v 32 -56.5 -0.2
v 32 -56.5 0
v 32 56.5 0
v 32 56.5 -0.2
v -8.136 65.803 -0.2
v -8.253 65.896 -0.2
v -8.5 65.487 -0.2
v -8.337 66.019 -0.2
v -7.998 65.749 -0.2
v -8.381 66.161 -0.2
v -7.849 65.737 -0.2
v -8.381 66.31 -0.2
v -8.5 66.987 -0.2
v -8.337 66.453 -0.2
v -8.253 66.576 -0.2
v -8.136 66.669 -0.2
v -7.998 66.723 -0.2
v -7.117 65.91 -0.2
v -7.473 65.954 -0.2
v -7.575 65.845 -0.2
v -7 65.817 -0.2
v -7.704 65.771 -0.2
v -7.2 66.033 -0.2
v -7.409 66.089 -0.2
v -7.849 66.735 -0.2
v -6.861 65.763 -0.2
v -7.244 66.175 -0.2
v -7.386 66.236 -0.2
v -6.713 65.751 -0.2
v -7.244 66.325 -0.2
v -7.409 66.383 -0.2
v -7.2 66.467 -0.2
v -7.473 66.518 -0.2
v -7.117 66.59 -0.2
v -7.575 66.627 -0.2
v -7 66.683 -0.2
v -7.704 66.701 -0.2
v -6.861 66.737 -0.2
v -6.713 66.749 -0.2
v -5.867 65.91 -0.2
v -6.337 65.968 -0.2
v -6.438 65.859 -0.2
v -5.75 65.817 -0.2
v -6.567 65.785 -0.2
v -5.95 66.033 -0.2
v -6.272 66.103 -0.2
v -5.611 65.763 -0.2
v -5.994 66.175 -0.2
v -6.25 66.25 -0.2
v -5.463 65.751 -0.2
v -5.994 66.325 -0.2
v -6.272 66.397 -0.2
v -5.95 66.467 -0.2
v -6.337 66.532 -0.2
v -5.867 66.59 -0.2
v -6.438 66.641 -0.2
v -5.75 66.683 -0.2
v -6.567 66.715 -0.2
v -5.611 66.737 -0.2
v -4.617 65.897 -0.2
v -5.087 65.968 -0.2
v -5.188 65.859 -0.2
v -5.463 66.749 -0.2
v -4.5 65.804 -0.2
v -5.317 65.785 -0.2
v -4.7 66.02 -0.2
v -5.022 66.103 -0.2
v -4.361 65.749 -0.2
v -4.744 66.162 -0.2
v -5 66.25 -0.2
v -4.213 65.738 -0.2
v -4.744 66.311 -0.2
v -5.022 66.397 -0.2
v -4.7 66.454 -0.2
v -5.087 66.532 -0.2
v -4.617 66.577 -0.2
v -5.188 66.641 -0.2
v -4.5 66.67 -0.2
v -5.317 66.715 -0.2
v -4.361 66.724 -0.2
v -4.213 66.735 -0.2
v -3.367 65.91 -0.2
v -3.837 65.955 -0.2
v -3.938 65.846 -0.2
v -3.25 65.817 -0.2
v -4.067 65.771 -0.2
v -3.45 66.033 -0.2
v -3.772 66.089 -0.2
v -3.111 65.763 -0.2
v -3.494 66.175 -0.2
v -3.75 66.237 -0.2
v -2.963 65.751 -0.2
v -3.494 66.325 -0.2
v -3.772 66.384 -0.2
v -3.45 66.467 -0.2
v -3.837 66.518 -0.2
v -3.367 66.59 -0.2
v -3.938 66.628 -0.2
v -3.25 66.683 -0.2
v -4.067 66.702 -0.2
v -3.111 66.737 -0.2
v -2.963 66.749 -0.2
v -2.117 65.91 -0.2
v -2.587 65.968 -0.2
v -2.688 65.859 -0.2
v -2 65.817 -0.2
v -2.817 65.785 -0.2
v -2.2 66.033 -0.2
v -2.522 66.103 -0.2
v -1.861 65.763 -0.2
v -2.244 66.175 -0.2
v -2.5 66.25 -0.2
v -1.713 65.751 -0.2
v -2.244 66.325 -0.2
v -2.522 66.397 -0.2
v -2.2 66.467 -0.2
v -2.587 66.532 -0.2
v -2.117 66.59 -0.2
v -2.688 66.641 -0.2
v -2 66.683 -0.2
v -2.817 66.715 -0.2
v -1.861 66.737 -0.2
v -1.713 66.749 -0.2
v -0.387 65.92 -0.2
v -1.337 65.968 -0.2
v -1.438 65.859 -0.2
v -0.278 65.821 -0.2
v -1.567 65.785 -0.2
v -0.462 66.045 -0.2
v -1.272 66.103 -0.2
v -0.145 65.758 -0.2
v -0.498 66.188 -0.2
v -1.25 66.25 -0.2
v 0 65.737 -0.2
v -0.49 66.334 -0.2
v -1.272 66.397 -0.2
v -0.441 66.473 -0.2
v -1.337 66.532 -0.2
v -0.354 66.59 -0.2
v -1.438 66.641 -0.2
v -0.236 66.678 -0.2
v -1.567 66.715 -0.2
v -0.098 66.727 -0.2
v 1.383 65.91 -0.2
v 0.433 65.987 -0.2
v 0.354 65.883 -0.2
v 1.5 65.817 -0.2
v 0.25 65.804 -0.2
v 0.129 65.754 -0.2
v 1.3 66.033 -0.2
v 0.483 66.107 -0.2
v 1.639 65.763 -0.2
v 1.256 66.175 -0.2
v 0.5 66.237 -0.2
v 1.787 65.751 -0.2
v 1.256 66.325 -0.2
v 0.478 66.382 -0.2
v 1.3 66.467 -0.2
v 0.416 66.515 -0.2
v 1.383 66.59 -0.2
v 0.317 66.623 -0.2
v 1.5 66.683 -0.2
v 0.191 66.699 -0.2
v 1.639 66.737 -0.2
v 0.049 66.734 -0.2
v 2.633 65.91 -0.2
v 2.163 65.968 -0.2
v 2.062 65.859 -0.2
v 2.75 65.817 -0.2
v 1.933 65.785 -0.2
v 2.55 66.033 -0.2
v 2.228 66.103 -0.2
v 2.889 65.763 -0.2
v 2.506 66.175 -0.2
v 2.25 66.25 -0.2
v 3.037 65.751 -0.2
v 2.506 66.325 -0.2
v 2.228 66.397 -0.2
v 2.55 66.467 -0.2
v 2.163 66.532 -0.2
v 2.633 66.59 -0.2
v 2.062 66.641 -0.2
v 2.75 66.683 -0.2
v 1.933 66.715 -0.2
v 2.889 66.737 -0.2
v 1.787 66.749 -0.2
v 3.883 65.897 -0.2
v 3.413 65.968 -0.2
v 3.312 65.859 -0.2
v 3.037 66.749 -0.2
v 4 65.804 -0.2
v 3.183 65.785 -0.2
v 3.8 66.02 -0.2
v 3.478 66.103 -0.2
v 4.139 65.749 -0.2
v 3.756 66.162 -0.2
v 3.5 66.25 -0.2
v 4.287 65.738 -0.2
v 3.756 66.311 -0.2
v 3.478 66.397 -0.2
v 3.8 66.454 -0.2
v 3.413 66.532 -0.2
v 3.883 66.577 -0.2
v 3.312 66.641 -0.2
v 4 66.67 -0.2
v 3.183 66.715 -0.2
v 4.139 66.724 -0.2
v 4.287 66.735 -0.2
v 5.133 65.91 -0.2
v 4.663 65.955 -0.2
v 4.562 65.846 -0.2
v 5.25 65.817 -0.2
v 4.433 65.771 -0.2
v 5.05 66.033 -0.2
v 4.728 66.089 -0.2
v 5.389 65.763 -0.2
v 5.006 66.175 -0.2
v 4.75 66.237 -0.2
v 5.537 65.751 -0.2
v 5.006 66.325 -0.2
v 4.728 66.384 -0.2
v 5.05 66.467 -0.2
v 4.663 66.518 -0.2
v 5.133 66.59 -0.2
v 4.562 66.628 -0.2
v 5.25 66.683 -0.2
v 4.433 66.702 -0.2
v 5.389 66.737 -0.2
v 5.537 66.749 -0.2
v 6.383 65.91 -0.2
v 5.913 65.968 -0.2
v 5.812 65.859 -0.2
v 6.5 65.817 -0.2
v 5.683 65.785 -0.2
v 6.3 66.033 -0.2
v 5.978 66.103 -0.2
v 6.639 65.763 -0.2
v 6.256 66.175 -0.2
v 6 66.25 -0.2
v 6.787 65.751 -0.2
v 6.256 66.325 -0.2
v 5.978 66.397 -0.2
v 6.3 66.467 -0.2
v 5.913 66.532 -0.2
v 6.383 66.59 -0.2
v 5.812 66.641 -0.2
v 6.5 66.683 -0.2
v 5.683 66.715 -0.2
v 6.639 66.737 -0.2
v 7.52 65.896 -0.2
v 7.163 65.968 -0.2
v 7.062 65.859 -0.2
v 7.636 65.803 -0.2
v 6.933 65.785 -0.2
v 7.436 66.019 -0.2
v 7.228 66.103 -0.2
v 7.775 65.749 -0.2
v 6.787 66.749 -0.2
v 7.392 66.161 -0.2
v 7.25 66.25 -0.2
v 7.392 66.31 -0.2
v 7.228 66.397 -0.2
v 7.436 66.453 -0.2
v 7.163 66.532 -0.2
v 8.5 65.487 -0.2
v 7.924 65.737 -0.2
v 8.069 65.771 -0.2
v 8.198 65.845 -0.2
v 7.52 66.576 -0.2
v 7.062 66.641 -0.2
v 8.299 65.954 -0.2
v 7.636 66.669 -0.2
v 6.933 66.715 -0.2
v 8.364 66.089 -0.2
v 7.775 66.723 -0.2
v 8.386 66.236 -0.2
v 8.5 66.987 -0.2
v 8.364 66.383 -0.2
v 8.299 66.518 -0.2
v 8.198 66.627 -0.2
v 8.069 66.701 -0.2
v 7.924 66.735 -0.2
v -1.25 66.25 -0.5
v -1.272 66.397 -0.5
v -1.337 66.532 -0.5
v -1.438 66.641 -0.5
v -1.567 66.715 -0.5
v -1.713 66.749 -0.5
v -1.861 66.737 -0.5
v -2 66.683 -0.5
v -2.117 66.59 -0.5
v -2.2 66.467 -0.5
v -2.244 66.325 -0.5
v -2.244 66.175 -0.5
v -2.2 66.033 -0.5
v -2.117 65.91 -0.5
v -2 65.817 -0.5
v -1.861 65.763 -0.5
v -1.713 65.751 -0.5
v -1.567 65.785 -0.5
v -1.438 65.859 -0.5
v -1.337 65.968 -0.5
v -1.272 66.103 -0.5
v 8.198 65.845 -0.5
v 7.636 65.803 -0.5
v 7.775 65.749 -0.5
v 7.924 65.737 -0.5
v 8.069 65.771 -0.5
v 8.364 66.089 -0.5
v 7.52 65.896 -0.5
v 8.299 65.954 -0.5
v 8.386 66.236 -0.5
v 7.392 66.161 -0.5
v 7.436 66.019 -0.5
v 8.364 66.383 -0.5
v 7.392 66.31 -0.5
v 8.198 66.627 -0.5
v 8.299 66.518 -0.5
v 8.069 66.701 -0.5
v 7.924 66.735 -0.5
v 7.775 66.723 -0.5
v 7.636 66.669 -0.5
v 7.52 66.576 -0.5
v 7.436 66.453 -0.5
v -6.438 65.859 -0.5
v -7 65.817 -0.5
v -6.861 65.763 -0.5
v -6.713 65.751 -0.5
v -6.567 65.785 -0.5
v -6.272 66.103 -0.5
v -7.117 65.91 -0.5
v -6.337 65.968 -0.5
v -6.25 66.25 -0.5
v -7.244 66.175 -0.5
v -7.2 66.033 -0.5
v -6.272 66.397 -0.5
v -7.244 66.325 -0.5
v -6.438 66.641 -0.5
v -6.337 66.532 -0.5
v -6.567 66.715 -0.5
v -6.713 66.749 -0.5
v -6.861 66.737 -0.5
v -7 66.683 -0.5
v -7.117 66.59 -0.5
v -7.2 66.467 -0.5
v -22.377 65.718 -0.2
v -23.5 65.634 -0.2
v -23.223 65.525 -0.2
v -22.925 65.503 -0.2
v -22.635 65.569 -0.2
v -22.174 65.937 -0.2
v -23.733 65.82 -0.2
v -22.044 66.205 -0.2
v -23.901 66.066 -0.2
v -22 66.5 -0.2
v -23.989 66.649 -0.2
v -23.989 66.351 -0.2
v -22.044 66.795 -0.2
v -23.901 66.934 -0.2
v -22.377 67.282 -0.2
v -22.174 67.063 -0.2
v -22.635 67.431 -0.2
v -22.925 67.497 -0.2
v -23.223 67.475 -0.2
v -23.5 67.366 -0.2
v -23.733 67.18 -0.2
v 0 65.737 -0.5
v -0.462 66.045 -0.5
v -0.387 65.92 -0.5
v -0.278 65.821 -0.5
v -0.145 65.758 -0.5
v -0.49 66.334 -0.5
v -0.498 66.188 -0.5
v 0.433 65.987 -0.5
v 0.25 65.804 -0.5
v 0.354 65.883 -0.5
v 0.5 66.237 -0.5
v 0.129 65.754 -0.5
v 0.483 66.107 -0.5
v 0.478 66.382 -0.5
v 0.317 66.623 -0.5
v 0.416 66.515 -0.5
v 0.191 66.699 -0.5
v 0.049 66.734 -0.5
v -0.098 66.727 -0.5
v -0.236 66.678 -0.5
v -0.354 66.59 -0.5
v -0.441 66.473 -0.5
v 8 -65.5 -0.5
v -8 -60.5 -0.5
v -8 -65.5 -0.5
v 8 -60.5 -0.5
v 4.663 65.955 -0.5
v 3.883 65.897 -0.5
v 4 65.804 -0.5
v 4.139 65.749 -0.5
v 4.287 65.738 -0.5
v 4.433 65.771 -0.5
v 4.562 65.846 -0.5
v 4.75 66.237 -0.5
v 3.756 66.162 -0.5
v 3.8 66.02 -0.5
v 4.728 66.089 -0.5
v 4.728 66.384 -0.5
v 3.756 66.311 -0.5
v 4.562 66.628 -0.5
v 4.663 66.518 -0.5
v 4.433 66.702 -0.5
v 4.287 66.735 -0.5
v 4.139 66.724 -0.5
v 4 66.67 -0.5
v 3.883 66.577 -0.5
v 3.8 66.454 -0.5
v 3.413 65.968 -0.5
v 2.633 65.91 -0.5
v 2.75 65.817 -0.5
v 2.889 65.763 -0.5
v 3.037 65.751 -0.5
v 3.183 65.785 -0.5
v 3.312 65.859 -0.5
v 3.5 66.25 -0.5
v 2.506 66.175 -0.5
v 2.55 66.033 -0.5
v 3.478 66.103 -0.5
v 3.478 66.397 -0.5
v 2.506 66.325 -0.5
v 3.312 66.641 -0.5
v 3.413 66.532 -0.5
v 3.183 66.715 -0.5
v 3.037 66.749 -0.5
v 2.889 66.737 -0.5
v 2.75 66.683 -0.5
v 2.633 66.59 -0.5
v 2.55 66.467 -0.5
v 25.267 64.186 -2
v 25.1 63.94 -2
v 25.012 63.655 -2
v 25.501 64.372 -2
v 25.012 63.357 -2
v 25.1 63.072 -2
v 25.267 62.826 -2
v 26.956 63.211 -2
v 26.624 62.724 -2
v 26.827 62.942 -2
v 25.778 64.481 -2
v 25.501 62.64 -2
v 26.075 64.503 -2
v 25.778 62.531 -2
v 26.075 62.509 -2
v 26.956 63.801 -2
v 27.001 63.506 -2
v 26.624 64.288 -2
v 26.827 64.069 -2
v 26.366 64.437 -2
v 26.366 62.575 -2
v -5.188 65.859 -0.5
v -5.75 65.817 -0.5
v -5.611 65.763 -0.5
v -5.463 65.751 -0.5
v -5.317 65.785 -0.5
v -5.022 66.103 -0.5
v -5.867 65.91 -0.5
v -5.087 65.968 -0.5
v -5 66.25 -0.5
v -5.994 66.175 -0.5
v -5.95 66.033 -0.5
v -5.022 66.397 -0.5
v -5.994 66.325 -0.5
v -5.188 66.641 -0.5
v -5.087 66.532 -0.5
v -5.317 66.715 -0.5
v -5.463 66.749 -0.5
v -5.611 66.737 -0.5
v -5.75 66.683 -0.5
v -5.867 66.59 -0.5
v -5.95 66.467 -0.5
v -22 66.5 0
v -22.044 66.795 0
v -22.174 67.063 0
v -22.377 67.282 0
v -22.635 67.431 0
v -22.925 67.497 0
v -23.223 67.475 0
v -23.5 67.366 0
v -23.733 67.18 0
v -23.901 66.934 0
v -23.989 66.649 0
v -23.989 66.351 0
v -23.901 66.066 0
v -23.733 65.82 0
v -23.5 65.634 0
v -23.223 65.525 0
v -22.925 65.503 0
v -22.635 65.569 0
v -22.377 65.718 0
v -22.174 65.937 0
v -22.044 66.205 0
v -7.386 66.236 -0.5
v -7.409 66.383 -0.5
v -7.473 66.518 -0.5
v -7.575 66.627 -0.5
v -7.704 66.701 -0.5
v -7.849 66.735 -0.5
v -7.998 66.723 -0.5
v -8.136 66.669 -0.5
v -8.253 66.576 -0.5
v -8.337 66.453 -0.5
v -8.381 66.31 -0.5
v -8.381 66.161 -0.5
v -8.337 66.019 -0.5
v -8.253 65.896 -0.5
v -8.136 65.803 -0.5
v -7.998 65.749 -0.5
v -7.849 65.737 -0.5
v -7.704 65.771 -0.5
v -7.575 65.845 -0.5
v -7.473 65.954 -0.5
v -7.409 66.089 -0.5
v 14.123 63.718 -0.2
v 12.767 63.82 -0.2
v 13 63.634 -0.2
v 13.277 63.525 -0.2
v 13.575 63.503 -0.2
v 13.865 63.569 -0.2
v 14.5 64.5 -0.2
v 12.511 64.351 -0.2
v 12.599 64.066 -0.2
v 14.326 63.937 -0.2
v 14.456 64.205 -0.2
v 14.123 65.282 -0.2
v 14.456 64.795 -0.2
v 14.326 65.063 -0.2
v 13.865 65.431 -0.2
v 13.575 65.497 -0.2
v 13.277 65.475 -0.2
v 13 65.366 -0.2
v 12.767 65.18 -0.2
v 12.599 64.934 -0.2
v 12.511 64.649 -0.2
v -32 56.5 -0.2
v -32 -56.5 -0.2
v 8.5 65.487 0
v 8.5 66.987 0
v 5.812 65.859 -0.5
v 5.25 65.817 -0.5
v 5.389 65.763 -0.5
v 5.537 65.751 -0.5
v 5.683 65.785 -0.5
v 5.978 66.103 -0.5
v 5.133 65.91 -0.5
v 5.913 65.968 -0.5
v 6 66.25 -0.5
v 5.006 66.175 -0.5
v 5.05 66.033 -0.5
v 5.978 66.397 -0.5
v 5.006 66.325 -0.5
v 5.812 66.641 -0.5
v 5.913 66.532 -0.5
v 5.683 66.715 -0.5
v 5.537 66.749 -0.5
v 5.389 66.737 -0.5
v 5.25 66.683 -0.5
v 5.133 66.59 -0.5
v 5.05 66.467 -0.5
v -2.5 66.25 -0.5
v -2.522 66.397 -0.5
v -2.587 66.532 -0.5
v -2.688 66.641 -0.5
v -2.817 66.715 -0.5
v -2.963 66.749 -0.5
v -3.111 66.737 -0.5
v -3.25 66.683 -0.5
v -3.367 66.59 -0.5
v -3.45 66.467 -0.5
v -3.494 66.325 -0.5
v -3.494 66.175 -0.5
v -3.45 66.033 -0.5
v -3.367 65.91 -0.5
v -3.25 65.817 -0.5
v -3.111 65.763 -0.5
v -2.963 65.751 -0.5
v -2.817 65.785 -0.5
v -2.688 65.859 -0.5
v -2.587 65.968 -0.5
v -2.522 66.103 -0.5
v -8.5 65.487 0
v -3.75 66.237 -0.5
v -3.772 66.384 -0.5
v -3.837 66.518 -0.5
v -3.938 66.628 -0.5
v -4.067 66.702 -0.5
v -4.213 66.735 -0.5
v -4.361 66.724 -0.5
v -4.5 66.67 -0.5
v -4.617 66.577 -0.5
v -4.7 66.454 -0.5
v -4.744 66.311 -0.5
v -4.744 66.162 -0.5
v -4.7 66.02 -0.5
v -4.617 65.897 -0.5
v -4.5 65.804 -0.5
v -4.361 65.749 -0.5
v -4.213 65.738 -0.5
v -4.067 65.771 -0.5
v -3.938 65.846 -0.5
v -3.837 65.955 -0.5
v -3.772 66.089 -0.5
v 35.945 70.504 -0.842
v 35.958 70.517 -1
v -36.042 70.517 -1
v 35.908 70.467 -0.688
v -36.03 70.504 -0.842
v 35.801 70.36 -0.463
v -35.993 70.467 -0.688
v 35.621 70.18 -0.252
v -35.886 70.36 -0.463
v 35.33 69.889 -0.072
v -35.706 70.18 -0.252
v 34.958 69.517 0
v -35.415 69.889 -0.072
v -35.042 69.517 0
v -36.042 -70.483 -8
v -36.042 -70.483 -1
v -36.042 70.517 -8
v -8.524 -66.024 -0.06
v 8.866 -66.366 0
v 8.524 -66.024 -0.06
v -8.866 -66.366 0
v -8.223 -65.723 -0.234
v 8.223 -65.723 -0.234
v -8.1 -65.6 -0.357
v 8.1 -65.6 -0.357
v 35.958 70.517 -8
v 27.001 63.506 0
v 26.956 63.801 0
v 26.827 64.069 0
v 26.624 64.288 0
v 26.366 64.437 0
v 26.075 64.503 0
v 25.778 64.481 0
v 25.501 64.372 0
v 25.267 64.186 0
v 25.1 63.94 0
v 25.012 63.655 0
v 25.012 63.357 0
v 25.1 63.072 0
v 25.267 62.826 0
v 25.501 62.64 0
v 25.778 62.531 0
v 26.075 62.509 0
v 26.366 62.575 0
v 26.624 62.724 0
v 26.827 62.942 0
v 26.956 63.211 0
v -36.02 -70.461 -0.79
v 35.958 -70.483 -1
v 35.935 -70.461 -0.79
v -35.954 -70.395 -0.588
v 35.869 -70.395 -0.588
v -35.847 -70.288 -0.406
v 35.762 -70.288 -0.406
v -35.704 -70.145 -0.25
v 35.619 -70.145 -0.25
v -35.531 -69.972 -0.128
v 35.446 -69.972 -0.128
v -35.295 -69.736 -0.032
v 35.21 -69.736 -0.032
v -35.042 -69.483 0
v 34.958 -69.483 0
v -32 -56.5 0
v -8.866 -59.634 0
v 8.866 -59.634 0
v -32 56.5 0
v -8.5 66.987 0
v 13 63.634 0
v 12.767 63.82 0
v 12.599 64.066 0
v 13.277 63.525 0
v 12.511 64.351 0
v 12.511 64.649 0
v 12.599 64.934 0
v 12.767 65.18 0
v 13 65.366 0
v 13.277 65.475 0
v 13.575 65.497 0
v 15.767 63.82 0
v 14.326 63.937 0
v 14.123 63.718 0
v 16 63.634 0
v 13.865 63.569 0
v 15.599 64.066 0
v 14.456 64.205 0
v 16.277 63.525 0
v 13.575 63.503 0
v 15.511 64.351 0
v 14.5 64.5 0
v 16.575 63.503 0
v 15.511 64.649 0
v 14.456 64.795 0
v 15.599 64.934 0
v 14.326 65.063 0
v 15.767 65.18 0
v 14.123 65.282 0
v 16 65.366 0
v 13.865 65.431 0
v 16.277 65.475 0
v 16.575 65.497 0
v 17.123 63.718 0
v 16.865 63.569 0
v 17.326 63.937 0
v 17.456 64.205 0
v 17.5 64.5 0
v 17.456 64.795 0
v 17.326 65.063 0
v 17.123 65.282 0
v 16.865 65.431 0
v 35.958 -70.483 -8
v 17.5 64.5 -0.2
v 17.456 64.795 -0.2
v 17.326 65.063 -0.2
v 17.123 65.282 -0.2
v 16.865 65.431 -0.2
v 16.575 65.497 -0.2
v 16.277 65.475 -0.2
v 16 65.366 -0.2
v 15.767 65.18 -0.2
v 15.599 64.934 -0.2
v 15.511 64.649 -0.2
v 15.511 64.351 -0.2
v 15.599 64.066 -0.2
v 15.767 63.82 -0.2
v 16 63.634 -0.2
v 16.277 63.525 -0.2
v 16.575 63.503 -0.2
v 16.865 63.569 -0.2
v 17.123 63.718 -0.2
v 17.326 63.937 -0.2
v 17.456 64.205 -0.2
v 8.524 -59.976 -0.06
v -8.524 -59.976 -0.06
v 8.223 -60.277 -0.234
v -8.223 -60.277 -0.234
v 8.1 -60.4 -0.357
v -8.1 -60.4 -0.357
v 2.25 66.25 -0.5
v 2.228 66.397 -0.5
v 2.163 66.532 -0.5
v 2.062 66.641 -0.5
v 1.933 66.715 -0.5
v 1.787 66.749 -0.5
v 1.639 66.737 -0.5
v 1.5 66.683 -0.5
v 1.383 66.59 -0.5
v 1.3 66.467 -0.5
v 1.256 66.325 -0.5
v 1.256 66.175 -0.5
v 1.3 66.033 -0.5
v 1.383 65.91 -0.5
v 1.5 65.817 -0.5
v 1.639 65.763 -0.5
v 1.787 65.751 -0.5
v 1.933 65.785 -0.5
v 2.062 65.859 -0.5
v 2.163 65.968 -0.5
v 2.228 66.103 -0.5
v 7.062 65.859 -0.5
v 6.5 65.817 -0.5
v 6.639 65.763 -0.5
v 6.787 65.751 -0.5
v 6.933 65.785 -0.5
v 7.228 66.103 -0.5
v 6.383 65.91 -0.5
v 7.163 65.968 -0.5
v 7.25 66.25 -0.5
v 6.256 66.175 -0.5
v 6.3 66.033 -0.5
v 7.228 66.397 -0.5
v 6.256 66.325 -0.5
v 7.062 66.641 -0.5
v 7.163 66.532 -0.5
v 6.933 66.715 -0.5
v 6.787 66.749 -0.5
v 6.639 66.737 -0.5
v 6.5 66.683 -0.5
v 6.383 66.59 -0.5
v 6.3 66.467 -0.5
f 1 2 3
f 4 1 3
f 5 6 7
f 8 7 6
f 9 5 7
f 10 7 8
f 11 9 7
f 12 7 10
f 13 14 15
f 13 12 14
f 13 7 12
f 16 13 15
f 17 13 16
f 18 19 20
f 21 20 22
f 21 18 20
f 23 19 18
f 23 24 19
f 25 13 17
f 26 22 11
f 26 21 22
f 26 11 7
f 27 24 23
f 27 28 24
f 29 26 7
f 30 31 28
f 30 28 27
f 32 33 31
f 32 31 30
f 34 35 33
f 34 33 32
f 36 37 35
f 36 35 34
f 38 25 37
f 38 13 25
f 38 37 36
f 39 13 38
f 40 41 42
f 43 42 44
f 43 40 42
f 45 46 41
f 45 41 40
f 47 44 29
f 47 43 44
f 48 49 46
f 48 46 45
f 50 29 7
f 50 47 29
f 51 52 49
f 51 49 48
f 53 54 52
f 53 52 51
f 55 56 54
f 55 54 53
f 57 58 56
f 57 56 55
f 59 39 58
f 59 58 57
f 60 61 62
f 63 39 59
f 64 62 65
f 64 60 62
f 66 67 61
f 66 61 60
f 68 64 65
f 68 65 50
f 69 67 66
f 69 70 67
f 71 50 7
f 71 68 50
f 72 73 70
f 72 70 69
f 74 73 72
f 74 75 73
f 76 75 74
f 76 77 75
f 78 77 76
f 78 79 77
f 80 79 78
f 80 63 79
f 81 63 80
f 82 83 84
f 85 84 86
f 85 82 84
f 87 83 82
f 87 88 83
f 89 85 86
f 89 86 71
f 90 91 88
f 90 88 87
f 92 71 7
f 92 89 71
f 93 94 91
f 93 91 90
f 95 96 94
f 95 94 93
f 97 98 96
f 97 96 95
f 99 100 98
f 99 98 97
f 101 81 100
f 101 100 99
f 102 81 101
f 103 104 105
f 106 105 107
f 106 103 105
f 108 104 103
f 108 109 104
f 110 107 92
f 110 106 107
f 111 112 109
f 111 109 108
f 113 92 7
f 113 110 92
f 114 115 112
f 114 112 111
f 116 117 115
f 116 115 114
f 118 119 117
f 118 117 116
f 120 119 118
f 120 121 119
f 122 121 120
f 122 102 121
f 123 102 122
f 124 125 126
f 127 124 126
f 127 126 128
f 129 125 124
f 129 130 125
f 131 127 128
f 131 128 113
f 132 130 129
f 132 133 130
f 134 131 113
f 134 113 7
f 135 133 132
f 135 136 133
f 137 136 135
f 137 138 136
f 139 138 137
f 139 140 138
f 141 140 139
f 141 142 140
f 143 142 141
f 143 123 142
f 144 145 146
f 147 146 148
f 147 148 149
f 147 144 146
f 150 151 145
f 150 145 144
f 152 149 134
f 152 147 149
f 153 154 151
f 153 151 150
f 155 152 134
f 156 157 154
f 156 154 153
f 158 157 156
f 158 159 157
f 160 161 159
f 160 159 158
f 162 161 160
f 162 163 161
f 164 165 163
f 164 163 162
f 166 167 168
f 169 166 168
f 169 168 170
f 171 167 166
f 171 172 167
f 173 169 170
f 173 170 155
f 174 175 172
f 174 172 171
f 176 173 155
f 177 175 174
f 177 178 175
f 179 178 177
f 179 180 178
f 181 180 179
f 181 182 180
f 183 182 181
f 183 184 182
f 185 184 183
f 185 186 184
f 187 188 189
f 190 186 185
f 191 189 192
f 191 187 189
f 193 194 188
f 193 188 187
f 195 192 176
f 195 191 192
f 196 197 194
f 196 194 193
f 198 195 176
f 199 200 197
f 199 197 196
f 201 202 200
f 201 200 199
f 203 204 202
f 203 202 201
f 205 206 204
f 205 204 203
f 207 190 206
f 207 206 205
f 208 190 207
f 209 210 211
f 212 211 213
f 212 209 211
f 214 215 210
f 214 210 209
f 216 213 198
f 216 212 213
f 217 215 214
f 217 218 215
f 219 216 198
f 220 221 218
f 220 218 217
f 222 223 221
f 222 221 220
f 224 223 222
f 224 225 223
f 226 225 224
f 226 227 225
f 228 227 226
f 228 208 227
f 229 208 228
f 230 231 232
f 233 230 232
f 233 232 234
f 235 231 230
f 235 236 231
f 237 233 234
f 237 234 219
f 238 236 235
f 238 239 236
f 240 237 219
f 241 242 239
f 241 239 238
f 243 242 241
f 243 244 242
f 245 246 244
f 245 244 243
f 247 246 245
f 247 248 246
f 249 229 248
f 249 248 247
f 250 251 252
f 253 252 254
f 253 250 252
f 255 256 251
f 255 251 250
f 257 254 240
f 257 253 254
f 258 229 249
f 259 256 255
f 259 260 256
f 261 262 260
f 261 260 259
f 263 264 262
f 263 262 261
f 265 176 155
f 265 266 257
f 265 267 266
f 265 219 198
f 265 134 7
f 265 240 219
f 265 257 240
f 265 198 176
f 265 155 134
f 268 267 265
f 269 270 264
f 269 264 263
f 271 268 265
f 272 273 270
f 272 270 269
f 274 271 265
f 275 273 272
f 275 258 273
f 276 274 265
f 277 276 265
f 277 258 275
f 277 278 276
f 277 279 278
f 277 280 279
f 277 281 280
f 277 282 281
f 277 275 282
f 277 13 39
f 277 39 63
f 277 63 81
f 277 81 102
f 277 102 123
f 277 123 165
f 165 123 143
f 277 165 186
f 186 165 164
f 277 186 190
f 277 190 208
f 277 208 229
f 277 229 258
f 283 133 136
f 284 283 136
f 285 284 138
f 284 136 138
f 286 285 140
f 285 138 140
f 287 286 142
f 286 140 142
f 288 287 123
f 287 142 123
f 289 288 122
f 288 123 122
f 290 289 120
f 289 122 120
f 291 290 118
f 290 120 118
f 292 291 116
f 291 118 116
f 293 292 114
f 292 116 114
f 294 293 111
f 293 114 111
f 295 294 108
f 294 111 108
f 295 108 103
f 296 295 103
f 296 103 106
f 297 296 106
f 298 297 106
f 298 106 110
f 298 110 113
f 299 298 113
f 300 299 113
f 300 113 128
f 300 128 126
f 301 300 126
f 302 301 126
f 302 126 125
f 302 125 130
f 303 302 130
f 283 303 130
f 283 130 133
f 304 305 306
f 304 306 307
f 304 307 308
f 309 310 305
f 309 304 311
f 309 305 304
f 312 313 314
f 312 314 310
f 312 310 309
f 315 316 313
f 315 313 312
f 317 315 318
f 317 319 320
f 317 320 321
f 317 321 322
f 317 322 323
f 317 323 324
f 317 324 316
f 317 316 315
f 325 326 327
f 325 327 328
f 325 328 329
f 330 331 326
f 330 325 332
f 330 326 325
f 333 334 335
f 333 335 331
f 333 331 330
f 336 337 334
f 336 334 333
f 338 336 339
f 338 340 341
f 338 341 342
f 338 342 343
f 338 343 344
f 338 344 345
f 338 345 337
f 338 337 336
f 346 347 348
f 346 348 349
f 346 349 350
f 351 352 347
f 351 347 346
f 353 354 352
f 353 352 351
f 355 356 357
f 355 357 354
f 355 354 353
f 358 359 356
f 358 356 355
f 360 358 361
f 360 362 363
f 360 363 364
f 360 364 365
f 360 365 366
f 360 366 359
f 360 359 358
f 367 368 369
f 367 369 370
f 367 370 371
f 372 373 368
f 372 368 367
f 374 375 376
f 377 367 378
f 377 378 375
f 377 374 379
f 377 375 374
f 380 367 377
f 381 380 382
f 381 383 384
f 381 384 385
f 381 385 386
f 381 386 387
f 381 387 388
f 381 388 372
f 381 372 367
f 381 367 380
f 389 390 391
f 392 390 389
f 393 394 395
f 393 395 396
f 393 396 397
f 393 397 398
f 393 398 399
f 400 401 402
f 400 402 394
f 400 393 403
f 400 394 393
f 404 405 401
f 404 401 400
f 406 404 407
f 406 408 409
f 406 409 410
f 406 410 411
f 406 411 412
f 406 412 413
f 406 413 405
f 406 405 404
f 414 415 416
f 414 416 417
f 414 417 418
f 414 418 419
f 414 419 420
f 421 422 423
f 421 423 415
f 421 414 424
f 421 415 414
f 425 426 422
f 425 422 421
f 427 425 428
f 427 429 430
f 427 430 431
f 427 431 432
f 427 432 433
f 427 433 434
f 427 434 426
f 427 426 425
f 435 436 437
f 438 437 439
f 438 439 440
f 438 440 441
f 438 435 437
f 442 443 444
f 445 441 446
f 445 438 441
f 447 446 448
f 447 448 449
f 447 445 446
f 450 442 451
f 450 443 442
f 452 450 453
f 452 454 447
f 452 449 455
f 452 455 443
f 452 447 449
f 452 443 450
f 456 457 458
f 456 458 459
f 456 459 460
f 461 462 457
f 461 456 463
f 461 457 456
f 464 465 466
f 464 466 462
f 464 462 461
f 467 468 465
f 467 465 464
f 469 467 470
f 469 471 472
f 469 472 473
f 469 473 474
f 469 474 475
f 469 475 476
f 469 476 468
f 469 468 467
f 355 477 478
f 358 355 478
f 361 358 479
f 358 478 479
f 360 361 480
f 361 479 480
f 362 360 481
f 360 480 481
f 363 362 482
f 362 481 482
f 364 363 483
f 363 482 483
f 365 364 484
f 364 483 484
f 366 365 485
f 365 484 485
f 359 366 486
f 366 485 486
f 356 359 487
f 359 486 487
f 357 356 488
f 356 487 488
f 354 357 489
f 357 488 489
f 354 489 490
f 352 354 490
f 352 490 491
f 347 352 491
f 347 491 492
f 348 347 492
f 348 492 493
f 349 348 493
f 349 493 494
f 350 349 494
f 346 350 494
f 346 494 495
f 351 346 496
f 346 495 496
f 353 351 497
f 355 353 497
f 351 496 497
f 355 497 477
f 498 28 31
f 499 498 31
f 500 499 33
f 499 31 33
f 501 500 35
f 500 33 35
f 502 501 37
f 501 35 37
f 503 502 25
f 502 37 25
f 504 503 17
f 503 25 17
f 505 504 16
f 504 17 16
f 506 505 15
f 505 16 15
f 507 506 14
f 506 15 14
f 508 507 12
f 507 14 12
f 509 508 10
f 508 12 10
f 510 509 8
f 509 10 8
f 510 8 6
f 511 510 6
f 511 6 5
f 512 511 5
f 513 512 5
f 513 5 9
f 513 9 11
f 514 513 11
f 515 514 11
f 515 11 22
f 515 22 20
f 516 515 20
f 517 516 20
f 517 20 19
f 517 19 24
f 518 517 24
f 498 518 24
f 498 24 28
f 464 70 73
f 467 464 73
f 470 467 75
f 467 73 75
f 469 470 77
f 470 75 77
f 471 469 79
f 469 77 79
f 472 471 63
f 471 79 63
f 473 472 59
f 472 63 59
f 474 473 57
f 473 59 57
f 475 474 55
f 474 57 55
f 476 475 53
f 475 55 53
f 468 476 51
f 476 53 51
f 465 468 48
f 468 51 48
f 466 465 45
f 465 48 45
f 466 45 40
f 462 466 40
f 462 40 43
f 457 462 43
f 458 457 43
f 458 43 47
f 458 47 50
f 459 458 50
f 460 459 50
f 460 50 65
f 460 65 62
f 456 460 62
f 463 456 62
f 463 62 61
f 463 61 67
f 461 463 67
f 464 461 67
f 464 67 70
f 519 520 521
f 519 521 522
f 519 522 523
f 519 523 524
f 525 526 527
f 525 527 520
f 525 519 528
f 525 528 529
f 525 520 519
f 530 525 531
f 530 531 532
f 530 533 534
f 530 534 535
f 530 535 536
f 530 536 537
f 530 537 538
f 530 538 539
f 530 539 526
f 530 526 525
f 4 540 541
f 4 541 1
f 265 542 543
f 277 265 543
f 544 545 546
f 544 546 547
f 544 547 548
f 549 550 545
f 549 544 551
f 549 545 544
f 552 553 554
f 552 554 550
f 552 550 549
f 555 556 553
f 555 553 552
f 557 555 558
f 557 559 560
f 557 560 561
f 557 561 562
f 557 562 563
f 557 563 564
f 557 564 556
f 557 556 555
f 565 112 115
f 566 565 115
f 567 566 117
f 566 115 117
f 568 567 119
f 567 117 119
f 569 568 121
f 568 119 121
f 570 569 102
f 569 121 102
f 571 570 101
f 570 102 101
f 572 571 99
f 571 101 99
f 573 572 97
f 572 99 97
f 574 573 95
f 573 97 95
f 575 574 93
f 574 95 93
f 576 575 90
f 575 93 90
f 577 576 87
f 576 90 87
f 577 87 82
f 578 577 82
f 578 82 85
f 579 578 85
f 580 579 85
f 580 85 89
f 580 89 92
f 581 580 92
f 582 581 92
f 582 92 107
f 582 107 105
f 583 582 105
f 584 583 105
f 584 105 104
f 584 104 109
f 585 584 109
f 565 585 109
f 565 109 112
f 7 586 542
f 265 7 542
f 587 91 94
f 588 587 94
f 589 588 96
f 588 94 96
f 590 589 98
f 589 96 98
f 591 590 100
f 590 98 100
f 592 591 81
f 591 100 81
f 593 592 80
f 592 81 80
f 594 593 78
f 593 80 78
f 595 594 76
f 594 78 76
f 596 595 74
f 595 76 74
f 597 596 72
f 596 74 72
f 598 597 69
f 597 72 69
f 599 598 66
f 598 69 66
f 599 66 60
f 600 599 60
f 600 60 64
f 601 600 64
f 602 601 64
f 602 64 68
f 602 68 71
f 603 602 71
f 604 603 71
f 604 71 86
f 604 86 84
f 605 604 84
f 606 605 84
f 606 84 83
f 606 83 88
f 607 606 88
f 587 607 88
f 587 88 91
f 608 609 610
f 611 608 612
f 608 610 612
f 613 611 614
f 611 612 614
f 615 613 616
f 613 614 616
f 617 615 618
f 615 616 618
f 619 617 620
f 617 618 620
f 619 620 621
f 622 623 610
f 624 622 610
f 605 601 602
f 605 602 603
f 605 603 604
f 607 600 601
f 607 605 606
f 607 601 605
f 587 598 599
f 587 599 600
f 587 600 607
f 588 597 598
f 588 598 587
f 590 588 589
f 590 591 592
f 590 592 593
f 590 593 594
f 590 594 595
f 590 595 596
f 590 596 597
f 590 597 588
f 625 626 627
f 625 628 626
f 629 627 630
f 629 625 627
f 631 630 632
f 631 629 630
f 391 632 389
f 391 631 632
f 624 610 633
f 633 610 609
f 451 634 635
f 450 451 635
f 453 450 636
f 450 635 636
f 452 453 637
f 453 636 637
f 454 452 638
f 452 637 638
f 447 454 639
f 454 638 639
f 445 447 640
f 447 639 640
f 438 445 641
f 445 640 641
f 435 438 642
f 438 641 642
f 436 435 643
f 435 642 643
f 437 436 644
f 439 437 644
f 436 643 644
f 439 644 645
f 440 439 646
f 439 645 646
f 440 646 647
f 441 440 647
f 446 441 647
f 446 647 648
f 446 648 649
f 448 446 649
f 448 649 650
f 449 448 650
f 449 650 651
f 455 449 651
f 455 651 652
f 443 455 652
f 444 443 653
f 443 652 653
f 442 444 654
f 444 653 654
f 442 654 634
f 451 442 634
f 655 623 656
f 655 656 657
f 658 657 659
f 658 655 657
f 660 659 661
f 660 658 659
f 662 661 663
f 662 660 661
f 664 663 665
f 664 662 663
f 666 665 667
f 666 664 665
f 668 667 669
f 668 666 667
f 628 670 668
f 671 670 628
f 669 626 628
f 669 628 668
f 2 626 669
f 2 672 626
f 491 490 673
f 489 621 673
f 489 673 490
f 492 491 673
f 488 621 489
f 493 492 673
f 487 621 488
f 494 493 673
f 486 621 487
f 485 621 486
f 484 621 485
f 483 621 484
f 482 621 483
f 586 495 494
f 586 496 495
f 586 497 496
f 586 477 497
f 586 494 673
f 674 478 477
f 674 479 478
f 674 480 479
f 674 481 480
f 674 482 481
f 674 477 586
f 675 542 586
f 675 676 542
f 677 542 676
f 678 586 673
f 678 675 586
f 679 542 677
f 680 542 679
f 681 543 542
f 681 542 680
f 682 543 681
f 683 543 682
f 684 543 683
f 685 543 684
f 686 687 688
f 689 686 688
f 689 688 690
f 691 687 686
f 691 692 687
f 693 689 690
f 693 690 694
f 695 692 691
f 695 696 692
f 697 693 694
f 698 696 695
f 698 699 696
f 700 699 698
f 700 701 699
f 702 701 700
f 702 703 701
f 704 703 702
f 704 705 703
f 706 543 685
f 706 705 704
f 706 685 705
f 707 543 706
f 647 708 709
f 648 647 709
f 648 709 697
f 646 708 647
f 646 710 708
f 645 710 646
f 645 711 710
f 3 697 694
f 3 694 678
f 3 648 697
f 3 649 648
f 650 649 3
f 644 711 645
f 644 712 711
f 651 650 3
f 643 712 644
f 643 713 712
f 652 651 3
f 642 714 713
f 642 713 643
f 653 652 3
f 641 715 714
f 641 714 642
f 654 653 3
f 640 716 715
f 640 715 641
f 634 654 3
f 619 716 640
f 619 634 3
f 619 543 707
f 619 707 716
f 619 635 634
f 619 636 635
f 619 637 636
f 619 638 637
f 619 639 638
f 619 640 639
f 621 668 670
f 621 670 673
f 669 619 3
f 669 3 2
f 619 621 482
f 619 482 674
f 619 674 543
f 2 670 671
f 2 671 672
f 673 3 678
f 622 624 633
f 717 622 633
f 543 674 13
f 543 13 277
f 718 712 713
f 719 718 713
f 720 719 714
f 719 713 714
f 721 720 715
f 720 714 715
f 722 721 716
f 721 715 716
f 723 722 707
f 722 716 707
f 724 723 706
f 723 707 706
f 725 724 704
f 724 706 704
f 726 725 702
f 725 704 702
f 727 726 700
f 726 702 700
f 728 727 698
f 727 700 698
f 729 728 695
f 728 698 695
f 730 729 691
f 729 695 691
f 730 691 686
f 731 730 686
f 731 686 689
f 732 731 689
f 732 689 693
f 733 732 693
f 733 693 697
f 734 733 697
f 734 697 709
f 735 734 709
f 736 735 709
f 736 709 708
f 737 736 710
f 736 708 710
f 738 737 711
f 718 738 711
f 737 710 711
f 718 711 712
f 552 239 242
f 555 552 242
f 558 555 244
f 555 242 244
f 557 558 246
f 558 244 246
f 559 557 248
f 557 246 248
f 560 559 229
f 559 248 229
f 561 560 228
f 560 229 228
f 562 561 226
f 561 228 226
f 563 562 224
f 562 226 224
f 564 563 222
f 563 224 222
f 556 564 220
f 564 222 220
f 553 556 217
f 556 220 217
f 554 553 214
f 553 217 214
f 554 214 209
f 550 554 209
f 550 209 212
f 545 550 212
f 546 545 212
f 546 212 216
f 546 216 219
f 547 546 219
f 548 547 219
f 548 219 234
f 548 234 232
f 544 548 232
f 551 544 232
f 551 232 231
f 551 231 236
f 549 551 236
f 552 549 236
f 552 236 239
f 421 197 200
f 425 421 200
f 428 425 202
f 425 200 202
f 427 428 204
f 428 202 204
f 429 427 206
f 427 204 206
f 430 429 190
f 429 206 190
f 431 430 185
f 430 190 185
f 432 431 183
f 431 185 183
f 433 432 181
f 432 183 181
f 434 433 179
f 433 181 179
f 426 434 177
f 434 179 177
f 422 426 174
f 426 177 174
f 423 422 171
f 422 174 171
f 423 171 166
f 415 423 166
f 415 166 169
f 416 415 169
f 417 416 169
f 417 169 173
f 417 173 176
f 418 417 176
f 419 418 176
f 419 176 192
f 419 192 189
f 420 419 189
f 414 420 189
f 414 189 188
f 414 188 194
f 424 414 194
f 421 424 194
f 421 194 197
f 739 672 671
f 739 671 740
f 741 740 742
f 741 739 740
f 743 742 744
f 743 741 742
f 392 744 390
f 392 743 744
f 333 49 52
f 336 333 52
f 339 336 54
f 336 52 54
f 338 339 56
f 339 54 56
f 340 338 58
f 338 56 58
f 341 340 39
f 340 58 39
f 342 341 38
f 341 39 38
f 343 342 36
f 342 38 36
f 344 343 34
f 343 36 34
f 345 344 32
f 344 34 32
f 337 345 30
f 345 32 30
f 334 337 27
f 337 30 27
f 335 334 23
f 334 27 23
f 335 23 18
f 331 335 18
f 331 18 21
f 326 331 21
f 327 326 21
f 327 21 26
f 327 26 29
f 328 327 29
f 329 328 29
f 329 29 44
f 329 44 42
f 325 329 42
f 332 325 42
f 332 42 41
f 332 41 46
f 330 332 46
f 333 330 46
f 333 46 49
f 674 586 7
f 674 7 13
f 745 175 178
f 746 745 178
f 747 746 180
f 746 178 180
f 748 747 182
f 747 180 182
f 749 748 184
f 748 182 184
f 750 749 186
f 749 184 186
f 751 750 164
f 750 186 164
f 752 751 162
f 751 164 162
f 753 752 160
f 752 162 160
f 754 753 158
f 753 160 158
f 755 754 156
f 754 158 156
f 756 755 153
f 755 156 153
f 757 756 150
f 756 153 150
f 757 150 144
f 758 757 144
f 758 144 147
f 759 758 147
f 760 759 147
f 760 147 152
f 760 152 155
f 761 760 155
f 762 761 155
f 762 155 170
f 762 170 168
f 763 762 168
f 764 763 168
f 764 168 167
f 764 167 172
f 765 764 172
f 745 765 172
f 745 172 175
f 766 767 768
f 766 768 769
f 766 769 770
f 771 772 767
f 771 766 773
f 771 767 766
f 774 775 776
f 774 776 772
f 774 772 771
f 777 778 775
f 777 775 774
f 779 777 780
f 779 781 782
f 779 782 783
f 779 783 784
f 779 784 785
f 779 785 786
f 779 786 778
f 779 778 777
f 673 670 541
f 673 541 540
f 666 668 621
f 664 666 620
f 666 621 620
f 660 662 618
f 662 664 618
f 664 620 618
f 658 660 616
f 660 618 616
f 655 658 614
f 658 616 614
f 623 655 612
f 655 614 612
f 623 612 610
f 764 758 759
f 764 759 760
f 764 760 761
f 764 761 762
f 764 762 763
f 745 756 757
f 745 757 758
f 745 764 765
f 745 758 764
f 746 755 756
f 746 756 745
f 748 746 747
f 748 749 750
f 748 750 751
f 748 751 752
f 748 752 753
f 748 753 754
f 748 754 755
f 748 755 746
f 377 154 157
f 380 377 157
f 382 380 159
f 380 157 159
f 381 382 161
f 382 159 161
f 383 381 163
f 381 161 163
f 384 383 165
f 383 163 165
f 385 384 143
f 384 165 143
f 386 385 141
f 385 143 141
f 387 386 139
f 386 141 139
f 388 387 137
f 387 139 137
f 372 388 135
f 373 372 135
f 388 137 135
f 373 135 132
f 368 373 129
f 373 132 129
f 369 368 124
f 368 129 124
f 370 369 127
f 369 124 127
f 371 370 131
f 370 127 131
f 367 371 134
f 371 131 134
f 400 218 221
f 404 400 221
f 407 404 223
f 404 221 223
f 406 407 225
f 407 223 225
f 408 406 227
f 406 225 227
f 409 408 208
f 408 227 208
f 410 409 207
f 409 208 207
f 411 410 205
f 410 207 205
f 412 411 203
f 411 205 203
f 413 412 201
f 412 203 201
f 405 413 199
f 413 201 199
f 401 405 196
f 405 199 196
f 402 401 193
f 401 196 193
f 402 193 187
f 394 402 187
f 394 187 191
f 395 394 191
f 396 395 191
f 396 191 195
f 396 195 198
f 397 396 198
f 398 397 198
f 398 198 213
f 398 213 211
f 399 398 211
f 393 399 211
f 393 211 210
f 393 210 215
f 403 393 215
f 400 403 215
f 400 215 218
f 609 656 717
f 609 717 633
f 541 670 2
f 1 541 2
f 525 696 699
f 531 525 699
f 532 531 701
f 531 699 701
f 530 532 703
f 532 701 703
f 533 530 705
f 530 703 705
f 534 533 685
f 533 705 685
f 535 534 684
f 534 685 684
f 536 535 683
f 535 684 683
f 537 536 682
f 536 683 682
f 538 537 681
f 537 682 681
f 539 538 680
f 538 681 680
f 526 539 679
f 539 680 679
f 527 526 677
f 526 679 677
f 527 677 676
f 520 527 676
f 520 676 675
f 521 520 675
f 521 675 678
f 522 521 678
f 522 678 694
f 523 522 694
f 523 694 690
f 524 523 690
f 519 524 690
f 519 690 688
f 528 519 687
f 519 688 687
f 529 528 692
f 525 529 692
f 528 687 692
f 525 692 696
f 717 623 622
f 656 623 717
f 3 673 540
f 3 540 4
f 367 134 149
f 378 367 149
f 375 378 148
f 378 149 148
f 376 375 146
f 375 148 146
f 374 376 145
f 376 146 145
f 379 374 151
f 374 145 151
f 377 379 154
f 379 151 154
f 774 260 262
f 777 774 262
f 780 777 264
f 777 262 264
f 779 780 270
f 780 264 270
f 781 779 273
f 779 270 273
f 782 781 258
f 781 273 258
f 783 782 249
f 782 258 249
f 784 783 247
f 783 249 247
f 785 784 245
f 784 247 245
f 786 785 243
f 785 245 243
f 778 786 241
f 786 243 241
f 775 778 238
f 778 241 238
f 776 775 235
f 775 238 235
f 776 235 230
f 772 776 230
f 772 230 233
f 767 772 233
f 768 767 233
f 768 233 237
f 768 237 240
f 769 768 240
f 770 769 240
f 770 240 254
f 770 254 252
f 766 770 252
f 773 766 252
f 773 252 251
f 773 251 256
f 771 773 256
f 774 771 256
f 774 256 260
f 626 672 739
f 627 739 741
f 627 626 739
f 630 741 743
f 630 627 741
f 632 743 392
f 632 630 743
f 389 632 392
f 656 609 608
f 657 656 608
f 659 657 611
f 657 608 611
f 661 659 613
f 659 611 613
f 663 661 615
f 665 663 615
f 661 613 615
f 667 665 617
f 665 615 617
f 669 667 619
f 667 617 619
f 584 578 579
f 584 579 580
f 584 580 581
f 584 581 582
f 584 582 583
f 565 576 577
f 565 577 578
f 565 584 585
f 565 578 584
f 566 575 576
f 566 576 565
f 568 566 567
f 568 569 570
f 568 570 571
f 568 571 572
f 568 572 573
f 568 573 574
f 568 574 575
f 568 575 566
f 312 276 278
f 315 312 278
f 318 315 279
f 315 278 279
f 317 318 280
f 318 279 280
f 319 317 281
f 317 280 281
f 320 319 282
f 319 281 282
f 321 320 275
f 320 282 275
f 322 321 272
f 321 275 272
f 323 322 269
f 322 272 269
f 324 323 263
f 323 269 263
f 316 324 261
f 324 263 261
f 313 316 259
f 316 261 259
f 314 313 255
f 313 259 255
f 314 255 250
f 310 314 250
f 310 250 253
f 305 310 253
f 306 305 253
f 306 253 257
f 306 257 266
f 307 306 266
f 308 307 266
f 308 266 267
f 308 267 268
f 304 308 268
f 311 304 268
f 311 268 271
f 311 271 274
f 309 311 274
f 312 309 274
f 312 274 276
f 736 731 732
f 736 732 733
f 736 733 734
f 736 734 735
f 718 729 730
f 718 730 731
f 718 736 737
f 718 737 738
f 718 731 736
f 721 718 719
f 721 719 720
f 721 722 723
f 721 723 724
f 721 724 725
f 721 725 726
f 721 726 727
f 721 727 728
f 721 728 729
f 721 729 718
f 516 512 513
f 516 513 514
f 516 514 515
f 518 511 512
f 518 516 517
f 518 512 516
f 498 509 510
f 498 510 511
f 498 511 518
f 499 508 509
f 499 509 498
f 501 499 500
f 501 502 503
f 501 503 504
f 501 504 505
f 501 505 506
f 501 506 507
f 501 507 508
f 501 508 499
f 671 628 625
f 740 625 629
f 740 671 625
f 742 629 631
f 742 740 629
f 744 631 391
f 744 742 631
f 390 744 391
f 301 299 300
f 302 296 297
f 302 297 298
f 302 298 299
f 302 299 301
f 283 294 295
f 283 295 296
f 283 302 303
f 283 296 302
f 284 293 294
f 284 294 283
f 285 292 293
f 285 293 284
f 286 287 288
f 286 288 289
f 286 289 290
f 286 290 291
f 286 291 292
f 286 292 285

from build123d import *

# Parameters (mm, degrees)
F1_W         = 72
F1_H         = 141
F2_DEPTH     = 8
F0_R         = 1
F3_DEPTH     = 0.2
F0_W         = 64
F0_H         = 113
F0_W_2       = 17
F0_H_2       = 1.5
F0_R_2       = 0.5
F4_DEPTH     = 0.2
F5_DEPTH     = 0.5
F1_R         = 1
F6_DEPTH     = 2
F0_W_3       = 16
F0_H_3       = 5
F7_DEPTH     = 0.5
F8_T1_DEPTH  = 77
F8_T3_DEPTH  = 146
F8_T5_DEPTH  = 16
F8_T7_DEPTH  = 5
F8_T13_DEPTH = 7.1650635095
F8_T17_DEPTH = 18.1650635095
F8_T24_DEPTH = 18.1650635095
F8_T28_DEPTH = 7.1650635095
F8_T35_DEPTH = 7.1650635095
F8_T39_DEPTH = 18.1650635095
F8_T46_DEPTH = 7.1650635095
F8_T50_DEPTH = 18.1650635095


# Not quite as in the source:
# - a fillet or chamfer that OpenCascade refuses, or shapes differently, is made with other operations: its cross-section is extruded or revolved along the edge and cut away or added


with BuildPart() as f2:
    # F1 (on face) → F2 (new body)
    with BuildSketch(Plane.XY):
        with Locations((-0.0423140228, 0.0165017247)):
            Rectangle(F1_W, F1_H)
    extrude(amount=-F2_DEPTH)

    # F0 (on Top) → F3 (cut)
    with BuildSketch(Plane.XY):
        with Locations((-23, 66.5)):
            Circle(F0_R)
        with Locations((13.5, 64.5)):
            Circle(F0_R)
        with Locations((16.5, 64.5)):
            Circle(F0_R)
    extrude(amount=-F3_DEPTH, mode=Mode.SUBTRACT)

    # F0 (on Top) → F4 (cut)
    with BuildSketch(Plane.XY):
        Rectangle(F0_W, F0_H)
        with Locations((0, 66.2368237972)):
            Rectangle(F0_W_2, F0_H_2)
        with Locations((-7.8863224118, 66.2359703599)):
            Circle(F0_R_2, mode=Mode.SUBTRACT)
        with Locations((-6.75, 66.25)):
            Circle(F0_R_2, mode=Mode.SUBTRACT)
        with Locations((-5.5, 66.25)):
            Circle(F0_R_2, mode=Mode.SUBTRACT)
        with Locations((-4.25, 66.2368237972)):
            Circle(F0_R_2, mode=Mode.SUBTRACT)
        with Locations((-3, 66.25)):
            Circle(F0_R_2, mode=Mode.SUBTRACT)
        with Locations((-1.75, 66.25)):
            Circle(F0_R_2, mode=Mode.SUBTRACT)
        with BuildLine():
            ThreePointArc((0, 65.7368237972), (-0.3535533906, 66.5903771878), (0.5, 66.2368237972))
            ThreePointArc((0.5, 66.2368237972), (0.3535533906, 65.8832704066), (0, 65.7368237972))
        make_face(mode=Mode.SUBTRACT)
        with Locations((1.75, 66.25)):
            Circle(F0_R_2, mode=Mode.SUBTRACT)
        with Locations((3, 66.25)):
            Circle(F0_R_2, mode=Mode.SUBTRACT)
        with Locations((4.25, 66.2368237972)):
            Circle(F0_R_2, mode=Mode.SUBTRACT)
        with Locations((5.5, 66.25)):
            Circle(F0_R_2, mode=Mode.SUBTRACT)
        with Locations((6.75, 66.25)):
            Circle(F0_R_2, mode=Mode.SUBTRACT)
        with Locations((7.8863224118, 66.2359703599)):
            Circle(F0_R_2, mode=Mode.SUBTRACT)
    extrude(amount=-F4_DEPTH, mode=Mode.SUBTRACT)

    # F0 (on Top) → F5 (cut)
    with BuildSketch(Plane.XY):
        with Locations((-7.8863224118, 66.2359703599)):
            Circle(F0_R_2)
        with Locations((-6.75, 66.25)):
            Circle(F0_R_2)
        with Locations((1.75, 66.25)):
            Circle(F0_R_2)
        with Locations((3, 66.25)):
            Circle(F0_R_2)
        with BuildLine():
            ThreePointArc((0, 65.7368237972), (0.3535533906, 65.8832704066), (0.5, 66.2368237972))
            ThreePointArc((0.5, 66.2368237972), (-0.3535533906, 66.5903771878), (0, 65.7368237972))
        make_face()
        with Locations((-4.25, 66.2368237972)):
            Circle(F0_R_2)
        with Locations((-3, 66.25)):
            Circle(F0_R_2)
        with Locations((-1.75, 66.25)):
            Circle(F0_R_2)
        with Locations((4.25, 66.2368237972)):
            Circle(F0_R_2)
        with Locations((5.5, 66.25)):
            Circle(F0_R_2)
        with Locations((6.75, 66.25)):
            Circle(F0_R_2)
        with Locations((7.8863224118, 66.2359703599)):
            Circle(F0_R_2)
        with Locations((-5.5, 66.25)):
            Circle(F0_R_2)
    extrude(amount=-F5_DEPTH, mode=Mode.SUBTRACT)

    # F1 (on face) → F6 (cut)
    with BuildSketch(Plane.XY):
        with Locations((26.0005407035, 63.5057538748)):
            Circle(F1_R)
    extrude(amount=-F6_DEPTH, mode=Mode.SUBTRACT)

    # F0 (on Top) → F7 (cut)
    with BuildSketch(Plane.XY):
        with Locations((0, -63)):
            Rectangle(F0_W_3, F0_H_3)
    extrude(amount=-F7_DEPTH, mode=Mode.SUBTRACT)

    # F8: fillet of radius 1 on 8 edges, made by hand

    # F8_s2 → F8_t1 (cut)
    with BuildSketch(Plane.YZ.offset(-38.5423140228)):
        with BuildLine():
            ThreePointArc((70.5165017247, -1), (70.2236085059, -0.2928932188), (69.5165017247, 0))
            Line((69.5165017247, 0), (70.5165017247, 0))
            Line((70.5165017247, 0), (70.5165017247, -1))
        make_face()
        with BuildLine():
            ThreePointArc((-70.4834982753, -1), (-70.1906050565, -0.2928932188), (-69.4834982753, 0))
            Line((-69.4834982753, 0), (-70.4834982753, 0))
            Line((-70.4834982753, 0), (-70.4834982753, -1))
        make_face()
    extrude(amount=F8_T1_DEPTH, mode=Mode.SUBTRACT)

    # F8_s4 → F8_t3 (cut)
    with BuildSketch(Plane.XZ.offset(-73.0165017247)):
        with BuildLine():
            ThreePointArc((-35.0423140228, 0), (-35.749420804, -0.2928932188), (-36.0423140228, -1))
            Line((-36.0423140228, -1), (-36.0423140228, 0))
            Line((-36.0423140228, 0), (-35.0423140228, 0))
        make_face()
        with BuildLine():
            ThreePointArc((35.9576859772, -1), (35.6647927584, -0.2928932188), (34.9576859772, 0))
            Line((34.9576859772, 0), (35.9576859772, 0))
            Line((35.9576859772, 0), (35.9576859772, -1))
        make_face()
    extrude(amount=F8_T3_DEPTH, mode=Mode.SUBTRACT)

    # F8_s6 → F8_t5 (cut)
    with BuildSketch(Plane.YZ.offset(-8)):
        with BuildLine():
            ThreePointArc((-59.6339745962, 0), (-60.1339745962, -0.1339745962), (-60.5, -0.5))
            Line((-60.5, -0.5), (-60.5, 0))
            Line((-60.5, 0), (-59.6339745962, 0))
        make_face()
        with BuildLine():
            ThreePointArc((-66.3660254038, 0), (-65.8660254038, -0.1339745962), (-65.5, -0.5))
            Line((-65.5, -0.5), (-65.5, 0))
            Line((-65.5, 0), (-66.3660254038, 0))
        make_face()
    extrude(amount=F8_T5_DEPTH, mode=Mode.SUBTRACT)

    # F8_s8 → F8_t7 (cut)
    with BuildSketch(Plane.XZ.offset(60.5)):
        with BuildLine():
            ThreePointArc((-8.8660254038, 0), (-8.3660254038, -0.1339745962), (-8, -0.5))
            Line((-8, -0.5), (-8, 0))
            Line((-8, 0), (-8.8660254038, 0))
        make_face()
        with BuildLine():
            ThreePointArc((8.8660254038, 0), (8.3660254038, -0.1339745962), (8, -0.5))
            Line((8, -0.5), (8, 0))
            Line((8, 0), (8.8660254038, 0))
        make_face()
    extrude(amount=F8_T7_DEPTH, mode=Mode.SUBTRACT)


with BuildPart() as f8_tool11:
    # F8_s12 → F8_t13 (new body)
    with BuildSketch(Plane.XZ.offset(65.5)):
        with BuildLine():
            ThreePointArc((8.8660254038, 0), (8.3660254038, -0.1339745962), (8, -0.5))
            Line((8, -0.5), (8, 0))
            Line((8, 0), (8.8660254038, 0))
        make_face()
    extrude(amount=-F8_T13_DEPTH)

    split(bisect_by=Plane.XZ.offset(60.5), keep=Keep.BOTTOM)


with BuildPart() as f8_tool15:
    # F8_s16 → F8_t17 (new body)
    with BuildSketch(Plane.YZ.offset(10.1650635095)):
        with BuildLine():
            ThreePointArc((-59.6339745962, 0), (-60.1339745962, -0.1339745962), (-60.5, -0.5))
            Line((-60.5, -0.5), (-60.5, 0))
            Line((-60.5, 0), (-59.6339745962, 0))
        make_face()
    extrude(amount=-F8_T17_DEPTH)

    split(bisect_by=Plane.YZ.offset(8), keep=Keep.TOP)


with BuildPart() as f8_tool11_1:
    add(f8_tool11.part)

    # F8_t19: intersect F8_tool15
    add(f8_tool15.part, mode=Mode.INTERSECT)


with BuildPart() as f2_1:
    add(f2.part)

    # F8_t9: cut F8_tool11
    add(f8_tool11_1.part, mode=Mode.SUBTRACT)


with BuildPart() as f8_tool22:
    # F8_s23 → F8_t24 (new body)
    with BuildSketch(Plane.YZ.offset(8)):
        with BuildLine():
            ThreePointArc((-59.6339745962, 0), (-60.1339745962, -0.1339745962), (-60.5, -0.5))
            Line((-60.5, -0.5), (-60.5, 0))
            Line((-60.5, 0), (-59.6339745962, 0))
        make_face()
    extrude(amount=-F8_T24_DEPTH)

    split(bisect_by=Plane.YZ.offset(-8), keep=Keep.BOTTOM)


with BuildPart() as f8_tool26:
    # F8_s27 → F8_t28 (new body)
    with BuildSketch(Plane.XZ.offset(58.3349364905)):
        with BuildLine():
            ThreePointArc((-8.8660254038, 0), (-8.3660254038, -0.1339745962), (-8, -0.5))
            Line((-8, -0.5), (-8, 0))
            Line((-8, 0), (-8.8660254038, 0))
        make_face()
    extrude(amount=F8_T28_DEPTH)

    split(bisect_by=Plane.XZ.offset(60.5), keep=Keep.BOTTOM)


with BuildPart() as f8_tool22_1:
    add(f8_tool22.part)

    # F8_t30: intersect F8_tool26
    add(f8_tool26.part, mode=Mode.INTERSECT)


with BuildPart() as f2_2:
    add(f2_1.part)

    # F8_t20: cut F8_tool22
    add(f8_tool22_1.part, mode=Mode.SUBTRACT)


with BuildPart() as f8_tool33:
    # F8_s34 → F8_t35 (new body)
    with BuildSketch(Plane.XZ.offset(60.5)):
        with BuildLine():
            ThreePointArc((-8.8660254038, 0), (-8.3660254038, -0.1339745962), (-8, -0.5))
            Line((-8, -0.5), (-8, 0))
            Line((-8, 0), (-8.8660254038, 0))
        make_face()
    extrude(amount=F8_T35_DEPTH)

    split(bisect_by=Plane.XZ.offset(65.5), keep=Keep.TOP)


with BuildPart() as f8_tool37:
    # F8_s38 → F8_t39 (new body)
    with BuildSketch(Plane.YZ.offset(-10.1650635095)):
        with BuildLine():
            ThreePointArc((-66.3660254038, 0), (-65.8660254038, -0.1339745962), (-65.5, -0.5))
            Line((-65.5, -0.5), (-65.5, 0))
            Line((-65.5, 0), (-66.3660254038, 0))
        make_face()
    extrude(amount=F8_T39_DEPTH)

    split(bisect_by=Plane.YZ.offset(-8), keep=Keep.BOTTOM)


with BuildPart() as f8_tool33_1:
    add(f8_tool33.part)

    # F8_t41: intersect F8_tool37
    add(f8_tool37.part, mode=Mode.INTERSECT)


with BuildPart() as f2_3:
    add(f2_2.part)

    # F8_t31: cut F8_tool33
    add(f8_tool33_1.part, mode=Mode.SUBTRACT)


with BuildPart() as f8_tool44:
    # F8_s45 → F8_t46 (new body)
    with BuildSketch(Plane.XZ.offset(67.6650635095)):
        with BuildLine():
            ThreePointArc((8.8660254038, 0), (8.3660254038, -0.1339745962), (8, -0.5))
            Line((8, -0.5), (8, 0))
            Line((8, 0), (8.8660254038, 0))
        make_face()
    extrude(amount=-F8_T46_DEPTH)

    split(bisect_by=Plane.XZ.offset(65.5), keep=Keep.TOP)


with BuildPart() as f8_tool48:
    # F8_s49 → F8_t50 (new body)
    with BuildSketch(Plane.YZ.offset(-8)):
        with BuildLine():
            ThreePointArc((-66.3660254038, 0), (-65.8660254038, -0.1339745962), (-65.5, -0.5))
            Line((-65.5, -0.5), (-65.5, 0))
            Line((-65.5, 0), (-66.3660254038, 0))
        make_face()
    extrude(amount=F8_T50_DEPTH)

    split(bisect_by=Plane.YZ.offset(8), keep=Keep.TOP)


with BuildPart() as f8_tool44_1:
    add(f8_tool44.part)

    # F8_t52: intersect F8_tool48
    add(f8_tool48.part, mode=Mode.INTERSECT)


with BuildPart() as f2_4:
    add(f2_3.part)

    # F8_t42: cut F8_tool44
    add(f8_tool44_1.part, mode=Mode.SUBTRACT)


solid = f2_4.part
